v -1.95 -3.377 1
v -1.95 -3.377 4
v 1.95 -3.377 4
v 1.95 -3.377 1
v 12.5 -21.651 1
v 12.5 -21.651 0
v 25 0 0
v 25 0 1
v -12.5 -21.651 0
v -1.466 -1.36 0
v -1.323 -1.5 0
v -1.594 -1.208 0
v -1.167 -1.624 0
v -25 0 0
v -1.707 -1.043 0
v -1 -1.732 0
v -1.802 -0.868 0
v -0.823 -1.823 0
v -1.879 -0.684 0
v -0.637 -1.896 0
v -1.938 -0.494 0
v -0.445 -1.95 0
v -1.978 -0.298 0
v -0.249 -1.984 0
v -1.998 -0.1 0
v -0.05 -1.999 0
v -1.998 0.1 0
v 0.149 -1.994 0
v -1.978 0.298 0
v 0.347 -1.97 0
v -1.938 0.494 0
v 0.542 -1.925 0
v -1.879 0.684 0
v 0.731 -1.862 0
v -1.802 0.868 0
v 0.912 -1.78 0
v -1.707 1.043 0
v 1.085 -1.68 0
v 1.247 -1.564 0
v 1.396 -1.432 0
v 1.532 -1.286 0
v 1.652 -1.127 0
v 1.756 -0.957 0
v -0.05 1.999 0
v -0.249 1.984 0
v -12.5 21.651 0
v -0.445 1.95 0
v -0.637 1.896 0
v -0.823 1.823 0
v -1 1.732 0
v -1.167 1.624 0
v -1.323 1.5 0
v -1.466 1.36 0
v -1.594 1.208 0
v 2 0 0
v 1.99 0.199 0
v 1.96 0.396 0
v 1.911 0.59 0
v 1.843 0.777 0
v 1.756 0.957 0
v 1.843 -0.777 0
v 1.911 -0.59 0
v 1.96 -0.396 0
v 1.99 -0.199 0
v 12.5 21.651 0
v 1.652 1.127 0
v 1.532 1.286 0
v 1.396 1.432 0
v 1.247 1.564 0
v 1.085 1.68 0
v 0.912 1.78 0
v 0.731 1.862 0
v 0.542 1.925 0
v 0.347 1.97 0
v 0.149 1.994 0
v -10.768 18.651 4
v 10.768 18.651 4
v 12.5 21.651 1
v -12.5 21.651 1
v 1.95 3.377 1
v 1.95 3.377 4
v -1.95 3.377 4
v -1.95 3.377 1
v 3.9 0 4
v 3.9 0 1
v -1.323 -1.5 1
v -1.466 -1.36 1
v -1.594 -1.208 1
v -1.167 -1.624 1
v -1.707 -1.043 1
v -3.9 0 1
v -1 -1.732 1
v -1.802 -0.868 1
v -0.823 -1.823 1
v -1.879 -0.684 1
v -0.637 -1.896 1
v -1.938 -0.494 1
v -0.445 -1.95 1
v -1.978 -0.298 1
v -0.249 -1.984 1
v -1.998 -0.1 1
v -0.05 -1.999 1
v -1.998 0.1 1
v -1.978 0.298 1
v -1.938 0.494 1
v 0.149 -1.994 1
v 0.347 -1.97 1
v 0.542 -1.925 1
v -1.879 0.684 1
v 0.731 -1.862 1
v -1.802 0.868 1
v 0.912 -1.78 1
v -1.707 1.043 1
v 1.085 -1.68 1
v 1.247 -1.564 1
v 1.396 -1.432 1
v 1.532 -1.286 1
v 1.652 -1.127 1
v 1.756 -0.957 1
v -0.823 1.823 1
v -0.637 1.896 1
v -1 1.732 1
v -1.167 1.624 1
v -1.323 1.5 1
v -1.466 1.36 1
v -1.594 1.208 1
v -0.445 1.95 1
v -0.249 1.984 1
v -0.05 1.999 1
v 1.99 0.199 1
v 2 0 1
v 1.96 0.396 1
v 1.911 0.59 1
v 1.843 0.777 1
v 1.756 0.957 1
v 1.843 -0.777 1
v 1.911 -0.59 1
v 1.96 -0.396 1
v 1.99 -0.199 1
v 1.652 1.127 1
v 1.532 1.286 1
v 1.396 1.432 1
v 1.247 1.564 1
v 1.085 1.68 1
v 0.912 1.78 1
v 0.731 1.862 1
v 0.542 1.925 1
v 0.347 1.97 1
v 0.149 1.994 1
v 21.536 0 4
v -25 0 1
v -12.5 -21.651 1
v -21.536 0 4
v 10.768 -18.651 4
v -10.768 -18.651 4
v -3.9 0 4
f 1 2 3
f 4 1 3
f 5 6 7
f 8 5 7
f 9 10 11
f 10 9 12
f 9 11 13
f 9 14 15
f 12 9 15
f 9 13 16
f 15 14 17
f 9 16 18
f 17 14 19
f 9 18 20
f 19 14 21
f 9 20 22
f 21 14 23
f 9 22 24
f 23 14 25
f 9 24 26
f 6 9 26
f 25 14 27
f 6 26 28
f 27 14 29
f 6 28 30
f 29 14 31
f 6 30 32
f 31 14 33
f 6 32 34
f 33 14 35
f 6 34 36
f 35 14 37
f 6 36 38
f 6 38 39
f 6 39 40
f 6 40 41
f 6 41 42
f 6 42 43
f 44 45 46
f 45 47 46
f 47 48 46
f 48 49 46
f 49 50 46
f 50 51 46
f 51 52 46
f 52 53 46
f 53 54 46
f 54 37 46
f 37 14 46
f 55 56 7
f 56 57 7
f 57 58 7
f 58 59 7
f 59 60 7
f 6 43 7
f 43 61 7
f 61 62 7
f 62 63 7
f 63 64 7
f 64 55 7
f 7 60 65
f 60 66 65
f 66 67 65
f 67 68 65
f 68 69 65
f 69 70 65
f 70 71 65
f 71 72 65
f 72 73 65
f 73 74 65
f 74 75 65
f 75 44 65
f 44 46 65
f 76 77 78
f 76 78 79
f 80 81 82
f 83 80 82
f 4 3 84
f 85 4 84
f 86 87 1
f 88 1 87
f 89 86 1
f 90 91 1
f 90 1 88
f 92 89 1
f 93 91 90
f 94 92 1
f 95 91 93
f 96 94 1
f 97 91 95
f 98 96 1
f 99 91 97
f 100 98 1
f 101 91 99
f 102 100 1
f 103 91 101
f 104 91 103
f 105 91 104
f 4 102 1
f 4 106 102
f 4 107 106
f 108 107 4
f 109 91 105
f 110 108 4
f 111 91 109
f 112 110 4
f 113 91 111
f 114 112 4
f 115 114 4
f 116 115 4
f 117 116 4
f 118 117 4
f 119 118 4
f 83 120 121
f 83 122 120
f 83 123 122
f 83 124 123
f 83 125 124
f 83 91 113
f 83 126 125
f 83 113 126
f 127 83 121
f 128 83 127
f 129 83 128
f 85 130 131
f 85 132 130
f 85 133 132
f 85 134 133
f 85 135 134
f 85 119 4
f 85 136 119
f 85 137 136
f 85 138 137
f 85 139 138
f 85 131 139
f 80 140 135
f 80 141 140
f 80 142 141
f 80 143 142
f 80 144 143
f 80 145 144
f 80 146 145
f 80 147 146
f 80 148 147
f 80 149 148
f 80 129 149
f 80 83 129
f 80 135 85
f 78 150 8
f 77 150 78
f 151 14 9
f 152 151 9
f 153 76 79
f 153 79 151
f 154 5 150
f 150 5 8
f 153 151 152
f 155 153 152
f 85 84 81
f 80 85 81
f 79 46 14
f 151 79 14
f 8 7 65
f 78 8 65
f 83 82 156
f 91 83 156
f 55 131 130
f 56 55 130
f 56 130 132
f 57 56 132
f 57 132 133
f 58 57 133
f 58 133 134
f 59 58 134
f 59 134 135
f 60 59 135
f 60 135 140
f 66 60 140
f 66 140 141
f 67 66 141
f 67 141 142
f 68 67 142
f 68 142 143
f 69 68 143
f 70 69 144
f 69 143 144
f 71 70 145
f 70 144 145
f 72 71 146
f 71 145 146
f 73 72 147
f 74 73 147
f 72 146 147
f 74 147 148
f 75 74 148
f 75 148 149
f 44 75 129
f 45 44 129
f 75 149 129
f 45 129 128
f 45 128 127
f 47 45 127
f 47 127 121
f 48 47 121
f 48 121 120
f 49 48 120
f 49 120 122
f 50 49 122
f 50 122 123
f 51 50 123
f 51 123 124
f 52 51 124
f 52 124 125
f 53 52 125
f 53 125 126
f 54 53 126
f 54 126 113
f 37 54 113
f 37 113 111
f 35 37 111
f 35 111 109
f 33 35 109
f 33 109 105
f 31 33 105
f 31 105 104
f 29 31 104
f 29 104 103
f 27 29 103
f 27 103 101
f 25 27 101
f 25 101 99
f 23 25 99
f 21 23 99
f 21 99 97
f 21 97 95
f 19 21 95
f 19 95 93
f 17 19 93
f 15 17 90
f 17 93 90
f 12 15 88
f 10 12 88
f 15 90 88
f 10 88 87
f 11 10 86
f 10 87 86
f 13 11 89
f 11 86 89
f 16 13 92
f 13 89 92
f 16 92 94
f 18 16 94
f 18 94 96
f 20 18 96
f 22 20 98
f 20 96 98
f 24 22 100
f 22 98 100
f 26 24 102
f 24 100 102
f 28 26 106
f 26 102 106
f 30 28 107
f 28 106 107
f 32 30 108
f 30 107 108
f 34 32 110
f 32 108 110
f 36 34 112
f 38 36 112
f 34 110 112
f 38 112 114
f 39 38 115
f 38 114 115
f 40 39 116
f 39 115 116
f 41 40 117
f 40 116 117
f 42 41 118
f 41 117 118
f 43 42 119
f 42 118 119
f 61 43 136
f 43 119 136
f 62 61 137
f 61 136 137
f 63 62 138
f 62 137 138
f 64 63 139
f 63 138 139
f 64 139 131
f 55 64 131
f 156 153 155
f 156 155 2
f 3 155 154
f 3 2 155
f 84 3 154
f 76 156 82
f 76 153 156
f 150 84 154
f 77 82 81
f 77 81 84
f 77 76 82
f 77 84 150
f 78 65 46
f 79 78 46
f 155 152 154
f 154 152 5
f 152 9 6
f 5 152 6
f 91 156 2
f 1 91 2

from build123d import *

# Parameters (mm, degrees)
PAD_DEPTH       = 4
POCKET_DEPTH    = 3
SKETCH002_R     = 2
POCKET001_DEPTH = 5
CHAMFER_SIZE    = 3


with BuildPart() as part:
    # Sketch → Pad (new body)
    with BuildSketch(Plane.XY):
        Polygon((12.5, 21.650635), (-12.5, 21.650635), (-25, 0), (-12.5, -21.650635), (12.5, -21.650635), (25, 0), align=None)
    extrude(amount=PAD_DEPTH)

    # Sketch001 (on Face8 of Pad) → Pocket (cut)
    with BuildSketch(Plane.XY.offset(4)):
        Polygon((1.95, 3.377499), (-1.95, 3.377499), (-3.9, 0), (-1.95, -3.377499), (1.95, -3.377499), (3.9, 0), align=None)
    extrude(amount=-POCKET_DEPTH, mode=Mode.SUBTRACT)

    # Sketch002 (on Face15 of Pocket) → Pocket001 (cut)
    with BuildSketch(Plane.XY.offset(1)):
        Circle(SKETCH002_R)
    extrude(amount=-POCKET001_DEPTH, mode=Mode.SUBTRACT)

    # Chamfer
    chamfer_edges = [part.edges().sort_by_distance(p)[0] for p in [
        (-18.75, 10.825318, 4),
        (-18.75, -10.825318, 4),
        (0, -21.650635, 4),
        (18.75, -10.825318, 4),
        (18.75, 10.825318, 4),
        (0, 21.650635, 4),
    ]]
    chamfer(chamfer_edges, length=CHAMFER_SIZE)


solid = part.part
